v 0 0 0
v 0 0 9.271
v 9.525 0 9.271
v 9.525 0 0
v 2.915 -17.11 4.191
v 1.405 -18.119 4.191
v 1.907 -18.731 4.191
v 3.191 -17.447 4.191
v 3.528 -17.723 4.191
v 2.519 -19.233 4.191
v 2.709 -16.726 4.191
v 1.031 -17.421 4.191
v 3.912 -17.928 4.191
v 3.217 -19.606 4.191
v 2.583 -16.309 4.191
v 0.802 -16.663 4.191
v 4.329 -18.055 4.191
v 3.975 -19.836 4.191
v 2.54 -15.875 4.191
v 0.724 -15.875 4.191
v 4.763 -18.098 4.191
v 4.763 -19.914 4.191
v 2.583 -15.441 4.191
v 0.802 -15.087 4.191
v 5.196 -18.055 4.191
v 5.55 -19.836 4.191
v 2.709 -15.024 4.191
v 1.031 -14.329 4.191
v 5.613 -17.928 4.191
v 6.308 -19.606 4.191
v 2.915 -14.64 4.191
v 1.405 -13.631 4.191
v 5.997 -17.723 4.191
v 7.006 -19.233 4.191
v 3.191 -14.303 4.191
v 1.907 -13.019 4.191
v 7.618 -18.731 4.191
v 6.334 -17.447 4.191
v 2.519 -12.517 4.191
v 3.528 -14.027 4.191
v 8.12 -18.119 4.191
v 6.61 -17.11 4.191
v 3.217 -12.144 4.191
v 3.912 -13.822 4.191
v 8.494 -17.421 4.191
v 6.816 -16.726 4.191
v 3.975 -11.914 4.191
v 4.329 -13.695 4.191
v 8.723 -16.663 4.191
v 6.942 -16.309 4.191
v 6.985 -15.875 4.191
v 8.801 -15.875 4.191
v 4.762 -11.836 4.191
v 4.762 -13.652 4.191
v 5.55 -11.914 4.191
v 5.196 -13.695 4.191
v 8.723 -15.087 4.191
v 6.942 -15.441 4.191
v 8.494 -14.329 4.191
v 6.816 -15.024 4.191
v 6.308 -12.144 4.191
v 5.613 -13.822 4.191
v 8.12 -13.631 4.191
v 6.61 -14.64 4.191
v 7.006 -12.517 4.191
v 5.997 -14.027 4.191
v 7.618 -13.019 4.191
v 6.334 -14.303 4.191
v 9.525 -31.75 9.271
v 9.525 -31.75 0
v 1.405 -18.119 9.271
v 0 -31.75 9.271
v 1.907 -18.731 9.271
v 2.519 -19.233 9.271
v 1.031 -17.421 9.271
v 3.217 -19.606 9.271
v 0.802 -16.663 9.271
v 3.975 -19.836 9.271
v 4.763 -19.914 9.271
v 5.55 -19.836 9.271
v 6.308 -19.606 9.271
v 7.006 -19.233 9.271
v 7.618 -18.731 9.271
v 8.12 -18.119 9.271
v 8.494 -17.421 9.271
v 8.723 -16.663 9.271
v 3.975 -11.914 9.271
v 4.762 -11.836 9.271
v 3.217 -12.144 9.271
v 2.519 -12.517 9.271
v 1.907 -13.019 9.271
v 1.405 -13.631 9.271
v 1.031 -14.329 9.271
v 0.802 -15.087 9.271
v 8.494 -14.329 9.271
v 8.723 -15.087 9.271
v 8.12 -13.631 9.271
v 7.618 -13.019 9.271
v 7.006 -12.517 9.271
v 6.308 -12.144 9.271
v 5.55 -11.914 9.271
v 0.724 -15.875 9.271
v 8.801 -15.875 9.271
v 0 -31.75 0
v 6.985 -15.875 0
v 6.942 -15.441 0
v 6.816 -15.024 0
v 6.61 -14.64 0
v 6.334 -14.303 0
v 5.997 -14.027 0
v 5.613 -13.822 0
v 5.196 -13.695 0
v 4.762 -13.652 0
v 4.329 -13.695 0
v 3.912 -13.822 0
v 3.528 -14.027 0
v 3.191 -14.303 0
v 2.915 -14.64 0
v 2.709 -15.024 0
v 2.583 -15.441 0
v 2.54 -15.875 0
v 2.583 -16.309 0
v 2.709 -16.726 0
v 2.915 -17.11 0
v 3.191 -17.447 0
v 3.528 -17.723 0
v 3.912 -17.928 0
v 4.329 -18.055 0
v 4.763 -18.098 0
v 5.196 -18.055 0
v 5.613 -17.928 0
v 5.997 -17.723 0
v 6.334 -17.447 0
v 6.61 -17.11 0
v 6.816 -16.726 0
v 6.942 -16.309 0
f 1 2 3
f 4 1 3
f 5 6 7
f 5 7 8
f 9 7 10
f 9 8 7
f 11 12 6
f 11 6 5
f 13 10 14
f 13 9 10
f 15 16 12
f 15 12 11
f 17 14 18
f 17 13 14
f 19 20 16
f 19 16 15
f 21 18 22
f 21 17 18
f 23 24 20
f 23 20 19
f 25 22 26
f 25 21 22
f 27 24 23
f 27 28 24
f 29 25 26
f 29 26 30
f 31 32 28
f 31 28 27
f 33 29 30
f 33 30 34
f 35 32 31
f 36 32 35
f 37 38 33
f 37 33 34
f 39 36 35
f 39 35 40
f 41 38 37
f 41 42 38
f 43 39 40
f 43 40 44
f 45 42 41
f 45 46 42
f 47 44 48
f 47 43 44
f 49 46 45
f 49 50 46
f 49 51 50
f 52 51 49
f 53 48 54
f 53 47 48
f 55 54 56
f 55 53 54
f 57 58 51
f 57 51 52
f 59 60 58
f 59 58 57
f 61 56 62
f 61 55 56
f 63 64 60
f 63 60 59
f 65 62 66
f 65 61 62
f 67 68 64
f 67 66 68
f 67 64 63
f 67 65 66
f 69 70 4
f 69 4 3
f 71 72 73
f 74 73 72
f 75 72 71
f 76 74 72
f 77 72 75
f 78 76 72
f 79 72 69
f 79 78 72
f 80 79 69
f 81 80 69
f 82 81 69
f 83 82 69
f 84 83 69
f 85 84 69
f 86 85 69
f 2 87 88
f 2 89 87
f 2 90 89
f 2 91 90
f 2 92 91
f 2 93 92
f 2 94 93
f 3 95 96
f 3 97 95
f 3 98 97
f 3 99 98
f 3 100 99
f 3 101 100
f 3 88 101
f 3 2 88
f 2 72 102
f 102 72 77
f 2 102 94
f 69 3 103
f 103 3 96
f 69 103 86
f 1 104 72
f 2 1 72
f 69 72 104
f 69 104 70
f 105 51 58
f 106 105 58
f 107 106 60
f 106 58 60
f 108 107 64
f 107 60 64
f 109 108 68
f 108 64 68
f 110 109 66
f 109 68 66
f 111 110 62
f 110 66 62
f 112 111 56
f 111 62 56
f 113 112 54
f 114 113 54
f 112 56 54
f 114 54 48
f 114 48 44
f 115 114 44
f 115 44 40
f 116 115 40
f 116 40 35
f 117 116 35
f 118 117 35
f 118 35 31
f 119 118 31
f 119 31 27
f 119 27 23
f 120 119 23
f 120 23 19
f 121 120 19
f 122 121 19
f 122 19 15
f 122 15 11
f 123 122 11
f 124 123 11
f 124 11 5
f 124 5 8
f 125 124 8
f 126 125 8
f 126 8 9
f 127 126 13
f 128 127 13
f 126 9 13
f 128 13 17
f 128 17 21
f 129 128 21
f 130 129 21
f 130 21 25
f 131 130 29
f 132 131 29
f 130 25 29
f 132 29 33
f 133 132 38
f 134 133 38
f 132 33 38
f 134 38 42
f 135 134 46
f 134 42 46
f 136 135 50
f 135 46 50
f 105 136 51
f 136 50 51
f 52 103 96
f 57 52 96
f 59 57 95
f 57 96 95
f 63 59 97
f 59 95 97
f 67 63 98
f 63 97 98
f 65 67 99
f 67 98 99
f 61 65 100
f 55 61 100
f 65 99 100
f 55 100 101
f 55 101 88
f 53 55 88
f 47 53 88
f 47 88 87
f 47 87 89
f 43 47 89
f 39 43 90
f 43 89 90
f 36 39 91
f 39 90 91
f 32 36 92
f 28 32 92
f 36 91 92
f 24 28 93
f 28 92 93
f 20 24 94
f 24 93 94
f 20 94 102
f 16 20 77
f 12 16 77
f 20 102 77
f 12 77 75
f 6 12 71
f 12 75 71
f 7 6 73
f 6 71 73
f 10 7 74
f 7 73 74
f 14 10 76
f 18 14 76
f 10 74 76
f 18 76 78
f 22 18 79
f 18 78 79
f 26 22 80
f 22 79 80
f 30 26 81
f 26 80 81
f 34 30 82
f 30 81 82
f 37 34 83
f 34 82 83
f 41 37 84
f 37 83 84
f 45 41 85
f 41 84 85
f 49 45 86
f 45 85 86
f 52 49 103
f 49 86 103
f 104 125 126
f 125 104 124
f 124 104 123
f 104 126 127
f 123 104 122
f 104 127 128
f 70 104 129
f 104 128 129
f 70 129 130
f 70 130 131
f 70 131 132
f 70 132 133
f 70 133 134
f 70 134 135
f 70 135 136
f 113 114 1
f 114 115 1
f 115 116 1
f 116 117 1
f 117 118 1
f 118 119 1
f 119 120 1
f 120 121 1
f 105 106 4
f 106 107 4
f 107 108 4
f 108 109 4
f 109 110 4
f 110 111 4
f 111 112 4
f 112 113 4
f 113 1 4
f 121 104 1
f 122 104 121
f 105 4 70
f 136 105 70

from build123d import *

# Parameters (mm, degrees)
F0_W     = 9.525
F0_H     = 9.271
F1_DEPTH = 31.75
F2_R     = 4.0386
F3_DEPTH = 5.08
F4_R     = 2.2225
F5_DEPTH = 4.192


with BuildPart() as f1:
    # F0 (on Front) → F1 (new body)
    with BuildSketch(Plane.XZ):
        with Locations((4.7625, 4.6355)):
            Rectangle(F0_W, F0_H)
    extrude(amount=F1_DEPTH)

    # F2 (on face) → F3 (cut)
    with BuildSketch(Plane.XY.offset(9.271)):
        with Locations((4.7625, -15.875)):
            Circle(F2_R)
    extrude(amount=-F3_DEPTH, mode=Mode.SUBTRACT)

    # F4 (on face) → F5 (cut, through all)
    with BuildSketch(Plane.XY.offset(4.191)):
        with Locations((4.7625, -15.875)):
            Circle(F4_R)
    extrude(amount=-F5_DEPTH, mode=Mode.SUBTRACT)


solid = f1.part
